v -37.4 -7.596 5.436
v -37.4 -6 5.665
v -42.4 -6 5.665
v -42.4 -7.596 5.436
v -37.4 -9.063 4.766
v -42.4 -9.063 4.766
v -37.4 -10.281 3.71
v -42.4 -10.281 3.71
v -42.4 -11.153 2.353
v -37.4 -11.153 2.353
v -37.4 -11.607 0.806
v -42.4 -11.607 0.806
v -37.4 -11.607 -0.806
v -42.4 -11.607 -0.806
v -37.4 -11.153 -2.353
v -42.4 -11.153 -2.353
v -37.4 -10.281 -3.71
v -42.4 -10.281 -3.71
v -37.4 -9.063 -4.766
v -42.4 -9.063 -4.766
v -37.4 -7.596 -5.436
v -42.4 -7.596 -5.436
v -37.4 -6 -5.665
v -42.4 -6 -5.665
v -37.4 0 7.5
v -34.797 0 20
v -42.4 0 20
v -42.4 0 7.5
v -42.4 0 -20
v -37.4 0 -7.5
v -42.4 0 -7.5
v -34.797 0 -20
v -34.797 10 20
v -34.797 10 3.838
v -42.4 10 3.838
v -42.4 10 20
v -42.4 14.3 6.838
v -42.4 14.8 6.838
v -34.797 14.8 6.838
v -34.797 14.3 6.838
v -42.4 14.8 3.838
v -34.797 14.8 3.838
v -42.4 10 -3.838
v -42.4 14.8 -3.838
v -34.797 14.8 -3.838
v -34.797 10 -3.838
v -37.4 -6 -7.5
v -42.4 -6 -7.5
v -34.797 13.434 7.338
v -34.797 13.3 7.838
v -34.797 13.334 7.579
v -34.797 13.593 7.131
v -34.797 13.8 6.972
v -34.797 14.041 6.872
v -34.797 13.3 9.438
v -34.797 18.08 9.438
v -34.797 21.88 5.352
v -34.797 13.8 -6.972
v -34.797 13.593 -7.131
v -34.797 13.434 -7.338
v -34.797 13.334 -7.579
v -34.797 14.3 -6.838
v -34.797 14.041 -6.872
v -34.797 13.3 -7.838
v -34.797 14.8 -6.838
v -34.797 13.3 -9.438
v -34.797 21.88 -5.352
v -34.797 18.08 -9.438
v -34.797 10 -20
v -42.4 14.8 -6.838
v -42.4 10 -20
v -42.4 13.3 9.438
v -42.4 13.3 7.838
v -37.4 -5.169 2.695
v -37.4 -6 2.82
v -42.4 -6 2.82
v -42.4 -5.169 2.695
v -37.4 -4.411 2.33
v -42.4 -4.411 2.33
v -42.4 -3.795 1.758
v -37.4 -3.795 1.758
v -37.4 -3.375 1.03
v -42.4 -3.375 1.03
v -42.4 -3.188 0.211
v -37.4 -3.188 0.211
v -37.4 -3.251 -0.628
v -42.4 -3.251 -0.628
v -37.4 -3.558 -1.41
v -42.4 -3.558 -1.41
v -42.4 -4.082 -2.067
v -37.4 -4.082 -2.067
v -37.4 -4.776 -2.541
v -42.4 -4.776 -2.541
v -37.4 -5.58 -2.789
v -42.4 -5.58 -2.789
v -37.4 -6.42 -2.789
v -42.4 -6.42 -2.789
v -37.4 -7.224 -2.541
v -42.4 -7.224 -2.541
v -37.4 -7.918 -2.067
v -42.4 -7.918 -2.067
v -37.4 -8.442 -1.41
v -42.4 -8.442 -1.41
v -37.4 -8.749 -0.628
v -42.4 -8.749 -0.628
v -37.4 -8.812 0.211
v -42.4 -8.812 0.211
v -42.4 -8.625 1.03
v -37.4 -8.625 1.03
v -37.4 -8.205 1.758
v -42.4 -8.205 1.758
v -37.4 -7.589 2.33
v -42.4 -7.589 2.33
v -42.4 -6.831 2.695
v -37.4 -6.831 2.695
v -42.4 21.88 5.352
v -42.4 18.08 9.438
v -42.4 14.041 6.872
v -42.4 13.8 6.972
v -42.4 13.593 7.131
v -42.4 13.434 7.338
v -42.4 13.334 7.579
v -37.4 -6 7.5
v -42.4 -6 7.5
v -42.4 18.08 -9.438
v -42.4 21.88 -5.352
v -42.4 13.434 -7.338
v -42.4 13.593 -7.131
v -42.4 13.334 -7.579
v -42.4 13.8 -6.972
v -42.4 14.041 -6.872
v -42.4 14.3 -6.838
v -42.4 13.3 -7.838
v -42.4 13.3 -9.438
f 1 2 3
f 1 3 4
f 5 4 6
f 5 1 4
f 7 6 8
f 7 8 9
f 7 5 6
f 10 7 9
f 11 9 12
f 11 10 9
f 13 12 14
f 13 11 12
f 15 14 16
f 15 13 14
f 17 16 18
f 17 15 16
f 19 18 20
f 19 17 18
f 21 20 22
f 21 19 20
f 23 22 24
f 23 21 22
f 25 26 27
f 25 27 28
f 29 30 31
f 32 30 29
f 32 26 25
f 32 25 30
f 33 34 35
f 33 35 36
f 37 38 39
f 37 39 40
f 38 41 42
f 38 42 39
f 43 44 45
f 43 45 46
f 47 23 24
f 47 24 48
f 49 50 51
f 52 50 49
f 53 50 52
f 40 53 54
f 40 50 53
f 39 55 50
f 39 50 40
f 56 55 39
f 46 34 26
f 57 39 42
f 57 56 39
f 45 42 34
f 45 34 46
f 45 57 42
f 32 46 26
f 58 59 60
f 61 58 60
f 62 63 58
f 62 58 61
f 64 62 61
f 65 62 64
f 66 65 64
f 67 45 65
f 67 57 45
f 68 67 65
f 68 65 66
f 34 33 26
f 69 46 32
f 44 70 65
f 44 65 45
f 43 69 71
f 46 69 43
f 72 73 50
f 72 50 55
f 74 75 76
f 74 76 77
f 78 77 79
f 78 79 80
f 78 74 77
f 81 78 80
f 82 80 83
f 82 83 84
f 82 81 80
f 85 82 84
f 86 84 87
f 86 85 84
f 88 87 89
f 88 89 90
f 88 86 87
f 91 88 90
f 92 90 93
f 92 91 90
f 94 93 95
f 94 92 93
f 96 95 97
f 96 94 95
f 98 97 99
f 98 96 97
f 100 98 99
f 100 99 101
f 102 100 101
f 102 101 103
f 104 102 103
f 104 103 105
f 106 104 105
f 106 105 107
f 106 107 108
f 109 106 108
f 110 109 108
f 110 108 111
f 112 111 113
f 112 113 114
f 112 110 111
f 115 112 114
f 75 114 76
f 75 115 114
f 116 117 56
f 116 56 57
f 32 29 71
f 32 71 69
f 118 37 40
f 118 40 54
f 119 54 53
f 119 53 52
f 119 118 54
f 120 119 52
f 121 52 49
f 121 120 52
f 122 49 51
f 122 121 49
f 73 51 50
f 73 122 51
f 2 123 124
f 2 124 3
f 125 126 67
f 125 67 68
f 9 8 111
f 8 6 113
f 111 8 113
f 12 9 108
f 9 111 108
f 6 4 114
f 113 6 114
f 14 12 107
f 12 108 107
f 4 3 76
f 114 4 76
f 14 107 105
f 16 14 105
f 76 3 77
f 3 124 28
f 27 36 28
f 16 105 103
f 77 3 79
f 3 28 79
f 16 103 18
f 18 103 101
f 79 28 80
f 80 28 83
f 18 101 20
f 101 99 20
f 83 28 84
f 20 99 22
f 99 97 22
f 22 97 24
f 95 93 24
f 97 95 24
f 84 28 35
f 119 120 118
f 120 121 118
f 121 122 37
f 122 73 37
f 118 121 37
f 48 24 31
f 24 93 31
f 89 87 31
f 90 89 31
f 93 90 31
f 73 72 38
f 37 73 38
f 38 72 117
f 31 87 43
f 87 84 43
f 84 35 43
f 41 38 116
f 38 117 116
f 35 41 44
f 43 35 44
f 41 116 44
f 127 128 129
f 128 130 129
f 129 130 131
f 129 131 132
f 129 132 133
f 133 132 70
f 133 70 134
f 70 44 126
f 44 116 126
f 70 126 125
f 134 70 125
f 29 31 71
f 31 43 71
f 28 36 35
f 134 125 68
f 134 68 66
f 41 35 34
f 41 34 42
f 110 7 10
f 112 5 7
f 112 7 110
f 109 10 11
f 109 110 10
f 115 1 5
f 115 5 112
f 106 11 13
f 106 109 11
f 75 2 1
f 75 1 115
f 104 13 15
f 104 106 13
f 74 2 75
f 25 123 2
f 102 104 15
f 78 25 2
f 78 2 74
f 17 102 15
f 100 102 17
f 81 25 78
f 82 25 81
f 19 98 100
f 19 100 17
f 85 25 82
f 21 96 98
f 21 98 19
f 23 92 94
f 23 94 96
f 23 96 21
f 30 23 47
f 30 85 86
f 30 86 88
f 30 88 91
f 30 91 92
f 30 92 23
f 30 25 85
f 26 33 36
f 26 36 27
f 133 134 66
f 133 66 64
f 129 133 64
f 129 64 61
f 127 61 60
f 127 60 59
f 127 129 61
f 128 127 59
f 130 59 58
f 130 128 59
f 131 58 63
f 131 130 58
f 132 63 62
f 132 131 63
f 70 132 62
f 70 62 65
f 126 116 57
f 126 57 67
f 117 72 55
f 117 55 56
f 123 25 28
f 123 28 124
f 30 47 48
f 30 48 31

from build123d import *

# Parameters (mm, degrees)
SKETCH1_W           = 74.8
SKETCH1_H           = 40
BOSS_EXTRUDE1_DEPTH = 10
BOSS_EXTRUDE2_DEPTH = 5
BOSS_EXTRUDE3_DEPTH = 84.8
SKETCH4_W           = 77.196671852
SKETCH4_H           = 40
CUT_EXTRUDE1_DEPTH  = 59


with BuildPart() as part:
    # Sketch1 → Boss-Extrude1 (new body)
    with BuildSketch(Plane(origin=(0, 0, 0), x_dir=(1, 0, 0), z_dir=(0, 1, 0))):
        Rectangle(SKETCH1_W, SKETCH1_H)
    extrude(amount=BOSS_EXTRUDE1_DEPTH)

    # Sketch2 → Boss-Extrude2 (add)
    # profile 1 of 2: a face of its own
    with BuildSketch(Plane(origin=(37.4, 0, 0), x_dir=(0, 0, -1), z_dir=(1, 0, 0))):
        with BuildLine():
            Line((7.5, 0), (-7.5, 0))
            Line((-7.5, 0), (-7.5, -6))
            Line((-7.5, -6), (-5.665, -6))
            ThreePointArc((-5.665, -6), (0, -11.665), (5.665, -6))
            Line((5.665, -6), (7.5, -6))
            Line((7.5, -6), (7.5, 0))
        make_face()
        with BuildLine():
            ThreePointArc((2.82, -6), (0, -8.82), (-2.82, -6))
            ThreePointArc((-2.82, -6), (0, -3.18), (2.82, -6))
        make_face(mode=Mode.SUBTRACT)
    # profile 2 of 2: a face of its own
    with BuildSketch(Plane(origin=(37.4, 0, 0), x_dir=(0, 0, -1), z_dir=(1, 0, 0))):
        Polygon((-20, 0), (-7.5, 0), (7.5, 0), (20, 0), (20, 10), (-20, 10), align=None)
    boss_extrude2 = extrude(amount=BOSS_EXTRUDE2_DEPTH)

    # Mirror1: Boss-Extrude2 across plane
    add(boss_extrude2.mirror(Plane(origin=(0, 0, 0), x_dir=(0, 0, 1), z_dir=(1, 0, 0))))

    # Sketch3 → Boss-Extrude3 (add)
    with BuildSketch(Plane.ZY.offset(42.4)):
        with BuildLine():
            Line((-3.838227356, 14.8), (-3.838227356, 10))
            Line((-3.838227356, 10), (3.838227356, 10))
            Line((3.838227356, 10), (3.838227356, 14.8))
            Line((3.838227356, 14.8), (6.838227356, 14.8))
            Line((6.838227356, 14.8), (6.838227356, 14.3))
            ThreePointArc((6.838227356, 14.3), (7.131120575, 13.592893219), (7.838227356, 13.3))
            Line((7.838227356, 13.3), (9.438227356, 13.3))
            Line((9.438227356, 13.3), (9.438227356, 14.8))
            Line((9.438227356, 14.8), (9.438227356, 18.08))
            Line((9.438227356, 18.08), (5.3521045, 21.88))
            Line((5.3521045, 21.88), (-5.3521045, 21.88))
            Line((-5.3521045, 21.88), (-9.438227356, 18.08))
            Line((-9.438227356, 18.08), (-9.438227356, 14.8))
            Line((-9.438227356, 14.8), (-9.438227356, 13.3))
            Line((-9.438227356, 13.3), (-7.838227356, 13.3))
            ThreePointArc((-7.838227356, 13.3), (-7.131120575, 13.592893219), (-6.838227356, 14.3))
            Line((-6.838227356, 14.3), (-6.838227356, 14.8))
            Line((-6.838227356, 14.8), (-3.838227356, 14.8))
        make_face()
    extrude(amount=-BOSS_EXTRUDE3_DEPTH)

    # Sketch4 → Cut-Extrude1 (cut)
    with BuildSketch(Plane(origin=(0, 21.88, 0), x_dir=(1, 0, 0), z_dir=(0, 1, 0))):
        with Locations((3.801664074, 0)):
            Rectangle(SKETCH4_W, SKETCH4_H)
    extrude(amount=-CUT_EXTRUDE1_DEPTH, mode=Mode.SUBTRACT)


solid = part.part
